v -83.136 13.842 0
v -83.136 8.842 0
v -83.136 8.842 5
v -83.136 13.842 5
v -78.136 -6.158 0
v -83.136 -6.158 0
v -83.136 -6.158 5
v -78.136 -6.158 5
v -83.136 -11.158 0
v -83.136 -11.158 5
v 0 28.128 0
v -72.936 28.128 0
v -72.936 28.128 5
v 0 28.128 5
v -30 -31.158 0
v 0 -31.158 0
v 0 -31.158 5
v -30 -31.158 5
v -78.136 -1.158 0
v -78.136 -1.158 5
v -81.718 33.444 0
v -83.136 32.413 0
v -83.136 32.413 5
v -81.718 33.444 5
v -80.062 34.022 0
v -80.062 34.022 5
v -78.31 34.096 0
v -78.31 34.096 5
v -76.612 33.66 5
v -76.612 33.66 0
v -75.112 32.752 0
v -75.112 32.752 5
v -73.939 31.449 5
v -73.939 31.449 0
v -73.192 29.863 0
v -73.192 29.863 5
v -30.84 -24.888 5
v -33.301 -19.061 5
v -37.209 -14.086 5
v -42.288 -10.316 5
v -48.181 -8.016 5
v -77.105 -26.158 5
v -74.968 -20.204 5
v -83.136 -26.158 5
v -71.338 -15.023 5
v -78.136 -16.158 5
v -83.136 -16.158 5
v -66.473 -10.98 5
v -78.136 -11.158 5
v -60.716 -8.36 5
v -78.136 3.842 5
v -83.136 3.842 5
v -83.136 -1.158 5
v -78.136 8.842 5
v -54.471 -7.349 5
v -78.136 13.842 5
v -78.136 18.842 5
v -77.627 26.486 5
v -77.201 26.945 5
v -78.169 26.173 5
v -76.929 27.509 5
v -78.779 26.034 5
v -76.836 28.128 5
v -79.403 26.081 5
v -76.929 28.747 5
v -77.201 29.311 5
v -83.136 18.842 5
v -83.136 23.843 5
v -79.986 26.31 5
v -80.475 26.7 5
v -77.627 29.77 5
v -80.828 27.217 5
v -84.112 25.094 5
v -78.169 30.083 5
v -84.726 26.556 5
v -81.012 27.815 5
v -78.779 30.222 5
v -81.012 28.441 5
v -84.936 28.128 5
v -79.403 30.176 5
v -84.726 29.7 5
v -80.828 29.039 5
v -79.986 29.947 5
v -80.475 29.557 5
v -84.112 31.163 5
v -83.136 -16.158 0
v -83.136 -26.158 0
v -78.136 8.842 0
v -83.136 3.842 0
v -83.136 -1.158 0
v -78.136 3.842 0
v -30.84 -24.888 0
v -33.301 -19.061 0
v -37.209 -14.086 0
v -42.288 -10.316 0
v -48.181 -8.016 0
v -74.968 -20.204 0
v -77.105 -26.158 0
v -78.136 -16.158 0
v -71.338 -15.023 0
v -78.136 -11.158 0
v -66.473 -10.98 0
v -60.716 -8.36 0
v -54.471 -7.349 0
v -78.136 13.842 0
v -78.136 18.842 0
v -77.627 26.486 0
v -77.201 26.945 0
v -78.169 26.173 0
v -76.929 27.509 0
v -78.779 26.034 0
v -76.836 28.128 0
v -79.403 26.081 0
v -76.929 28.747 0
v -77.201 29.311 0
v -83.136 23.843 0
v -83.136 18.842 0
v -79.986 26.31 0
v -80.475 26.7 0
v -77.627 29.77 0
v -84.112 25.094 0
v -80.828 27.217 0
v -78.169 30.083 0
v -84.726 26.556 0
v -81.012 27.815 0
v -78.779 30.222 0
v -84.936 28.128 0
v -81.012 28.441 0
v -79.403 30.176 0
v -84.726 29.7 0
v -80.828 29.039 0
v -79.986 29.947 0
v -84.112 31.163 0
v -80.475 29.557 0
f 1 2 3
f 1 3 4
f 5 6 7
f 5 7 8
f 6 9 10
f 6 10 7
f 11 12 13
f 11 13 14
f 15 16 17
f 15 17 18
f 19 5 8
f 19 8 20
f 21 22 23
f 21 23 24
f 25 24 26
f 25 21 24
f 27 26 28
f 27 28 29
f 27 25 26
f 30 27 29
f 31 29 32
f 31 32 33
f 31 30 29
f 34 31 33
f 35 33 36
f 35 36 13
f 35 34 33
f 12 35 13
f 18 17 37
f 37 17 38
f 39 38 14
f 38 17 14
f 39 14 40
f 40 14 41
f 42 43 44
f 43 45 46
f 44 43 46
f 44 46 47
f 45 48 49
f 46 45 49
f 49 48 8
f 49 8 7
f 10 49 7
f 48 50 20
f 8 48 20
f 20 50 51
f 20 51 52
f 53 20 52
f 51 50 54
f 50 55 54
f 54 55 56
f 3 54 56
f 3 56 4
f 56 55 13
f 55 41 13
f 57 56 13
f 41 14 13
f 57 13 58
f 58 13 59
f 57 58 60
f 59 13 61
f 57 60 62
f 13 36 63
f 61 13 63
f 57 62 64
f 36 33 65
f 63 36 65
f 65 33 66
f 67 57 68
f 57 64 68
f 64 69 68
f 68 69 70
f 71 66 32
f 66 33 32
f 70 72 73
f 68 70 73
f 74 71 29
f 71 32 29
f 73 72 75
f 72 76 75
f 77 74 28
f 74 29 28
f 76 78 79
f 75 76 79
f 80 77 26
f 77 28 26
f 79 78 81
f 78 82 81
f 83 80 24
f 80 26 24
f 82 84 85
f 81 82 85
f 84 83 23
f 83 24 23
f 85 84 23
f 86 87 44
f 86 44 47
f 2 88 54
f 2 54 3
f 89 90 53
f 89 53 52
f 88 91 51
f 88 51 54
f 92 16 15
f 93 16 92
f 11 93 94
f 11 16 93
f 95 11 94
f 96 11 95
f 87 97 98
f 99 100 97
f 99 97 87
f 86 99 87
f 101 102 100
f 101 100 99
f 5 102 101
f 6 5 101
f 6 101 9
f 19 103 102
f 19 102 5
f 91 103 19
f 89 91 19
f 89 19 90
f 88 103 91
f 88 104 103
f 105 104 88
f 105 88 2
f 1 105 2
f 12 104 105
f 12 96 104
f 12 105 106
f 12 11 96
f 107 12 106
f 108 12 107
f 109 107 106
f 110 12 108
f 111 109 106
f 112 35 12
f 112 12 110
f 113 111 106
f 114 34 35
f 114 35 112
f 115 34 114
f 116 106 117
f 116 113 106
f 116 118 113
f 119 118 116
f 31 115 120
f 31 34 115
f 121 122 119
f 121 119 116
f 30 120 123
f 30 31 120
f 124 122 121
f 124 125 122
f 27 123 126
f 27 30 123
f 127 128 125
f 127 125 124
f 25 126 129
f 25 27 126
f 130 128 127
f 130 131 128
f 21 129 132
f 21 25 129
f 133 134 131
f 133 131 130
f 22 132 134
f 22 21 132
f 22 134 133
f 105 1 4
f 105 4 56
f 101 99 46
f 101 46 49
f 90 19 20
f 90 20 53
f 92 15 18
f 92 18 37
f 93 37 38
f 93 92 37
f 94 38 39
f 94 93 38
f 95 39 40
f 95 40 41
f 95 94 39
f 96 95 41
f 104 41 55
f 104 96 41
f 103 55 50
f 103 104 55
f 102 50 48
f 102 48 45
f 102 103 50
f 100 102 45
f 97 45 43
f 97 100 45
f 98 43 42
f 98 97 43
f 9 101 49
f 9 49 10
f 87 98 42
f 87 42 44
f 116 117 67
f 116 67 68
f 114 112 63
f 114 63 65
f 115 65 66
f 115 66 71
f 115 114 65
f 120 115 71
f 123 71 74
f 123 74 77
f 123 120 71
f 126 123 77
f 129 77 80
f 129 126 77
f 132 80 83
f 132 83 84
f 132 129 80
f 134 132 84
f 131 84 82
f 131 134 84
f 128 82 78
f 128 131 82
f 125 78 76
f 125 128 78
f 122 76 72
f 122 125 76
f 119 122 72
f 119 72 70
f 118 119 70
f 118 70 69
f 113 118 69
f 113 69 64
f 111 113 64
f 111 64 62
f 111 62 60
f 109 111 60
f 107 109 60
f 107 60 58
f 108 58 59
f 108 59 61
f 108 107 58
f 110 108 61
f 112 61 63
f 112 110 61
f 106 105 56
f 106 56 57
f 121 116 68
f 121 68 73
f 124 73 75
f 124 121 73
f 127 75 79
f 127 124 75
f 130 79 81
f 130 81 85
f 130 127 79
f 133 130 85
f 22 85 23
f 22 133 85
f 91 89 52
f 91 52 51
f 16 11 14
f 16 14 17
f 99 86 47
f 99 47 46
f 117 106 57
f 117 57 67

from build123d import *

# Parameters (mm, degrees)
ESQUISSE1_R        = 2.1
BOSS_EXTRU_1_DEPTH = 5


with BuildPart() as part:
    # Esquisse1 → Boss.-Extru.1 (new body)
    with BuildSketch(Plane.XY):
        with BuildLine():
            Line((-78.135883383, 18.842375861), (-83.135883383, 18.842375861))
            Line((-83.135883383, 18.842375861), (-83.135883383, 23.843375961))
            ThreePointArc((-83.135883383, 23.843375961), (-84.935883383, 28.128233018), (-83.135883383, 32.413090075))
            ThreePointArc((-83.135883383, 32.413090075), (-76.612093375, 33.659959692), (-72.935883383, 28.128233018))
            Line((-72.935883383, 28.128233018), (0, 28.128233018))
            Line((0, 28.128233018), (0, 13.842375861))
            Line((0, 13.842375861), (0, -31.157624139))
            Line((0, -31.157624139), (-30, -31.157624139))
            ThreePointArc((-30, -31.157624139), (-51.303897557, -7.472735951), (-77.105155917, -26.157624139))
            Line((-77.105155917, -26.157624139), (-83.135883383, -26.157624139))
            Line((-83.135883383, -26.157624139), (-83.135883383, -16.157624139))
            Line((-83.135883383, -16.157624139), (-78.135883383, -16.157624139))
            Line((-78.135883383, -16.157624139), (-78.135883383, -11.157624139))
            Line((-78.135883383, -11.157624139), (-83.135883383, -11.157624139))
            Line((-83.135883383, -11.157624139), (-83.135883383, -6.157624139))
            Line((-83.135883383, -6.157624139), (-78.135883383, -6.157624139))
            Line((-78.135883383, -6.157624139), (-78.135883383, -1.157624139))
            Line((-78.135883383, -1.157624139), (-83.135883383, -1.157624139))
            Line((-83.135883383, -1.157624139), (-83.135883383, 3.842375861))
            Line((-83.135883383, 3.842375861), (-78.135883383, 3.842375861))
            Line((-78.135883383, 3.842375861), (-78.135883383, 8.842375861))
            Line((-78.135883383, 8.842375861), (-83.135883383, 8.842375861))
            Line((-83.135883383, 8.842375861), (-83.135883383, 13.842375861))
            Line((-83.135883383, 13.842375861), (-78.135883383, 13.842375861))
            Line((-78.135883383, 13.842375861), (-78.135883383, 18.842375861))
        make_face()
        with Locations((-78.935883383, 28.128233018)):
            Circle(ESQUISSE1_R, mode=Mode.SUBTRACT)
    extrude(amount=BOSS_EXTRU_1_DEPTH)


solid = part.part
